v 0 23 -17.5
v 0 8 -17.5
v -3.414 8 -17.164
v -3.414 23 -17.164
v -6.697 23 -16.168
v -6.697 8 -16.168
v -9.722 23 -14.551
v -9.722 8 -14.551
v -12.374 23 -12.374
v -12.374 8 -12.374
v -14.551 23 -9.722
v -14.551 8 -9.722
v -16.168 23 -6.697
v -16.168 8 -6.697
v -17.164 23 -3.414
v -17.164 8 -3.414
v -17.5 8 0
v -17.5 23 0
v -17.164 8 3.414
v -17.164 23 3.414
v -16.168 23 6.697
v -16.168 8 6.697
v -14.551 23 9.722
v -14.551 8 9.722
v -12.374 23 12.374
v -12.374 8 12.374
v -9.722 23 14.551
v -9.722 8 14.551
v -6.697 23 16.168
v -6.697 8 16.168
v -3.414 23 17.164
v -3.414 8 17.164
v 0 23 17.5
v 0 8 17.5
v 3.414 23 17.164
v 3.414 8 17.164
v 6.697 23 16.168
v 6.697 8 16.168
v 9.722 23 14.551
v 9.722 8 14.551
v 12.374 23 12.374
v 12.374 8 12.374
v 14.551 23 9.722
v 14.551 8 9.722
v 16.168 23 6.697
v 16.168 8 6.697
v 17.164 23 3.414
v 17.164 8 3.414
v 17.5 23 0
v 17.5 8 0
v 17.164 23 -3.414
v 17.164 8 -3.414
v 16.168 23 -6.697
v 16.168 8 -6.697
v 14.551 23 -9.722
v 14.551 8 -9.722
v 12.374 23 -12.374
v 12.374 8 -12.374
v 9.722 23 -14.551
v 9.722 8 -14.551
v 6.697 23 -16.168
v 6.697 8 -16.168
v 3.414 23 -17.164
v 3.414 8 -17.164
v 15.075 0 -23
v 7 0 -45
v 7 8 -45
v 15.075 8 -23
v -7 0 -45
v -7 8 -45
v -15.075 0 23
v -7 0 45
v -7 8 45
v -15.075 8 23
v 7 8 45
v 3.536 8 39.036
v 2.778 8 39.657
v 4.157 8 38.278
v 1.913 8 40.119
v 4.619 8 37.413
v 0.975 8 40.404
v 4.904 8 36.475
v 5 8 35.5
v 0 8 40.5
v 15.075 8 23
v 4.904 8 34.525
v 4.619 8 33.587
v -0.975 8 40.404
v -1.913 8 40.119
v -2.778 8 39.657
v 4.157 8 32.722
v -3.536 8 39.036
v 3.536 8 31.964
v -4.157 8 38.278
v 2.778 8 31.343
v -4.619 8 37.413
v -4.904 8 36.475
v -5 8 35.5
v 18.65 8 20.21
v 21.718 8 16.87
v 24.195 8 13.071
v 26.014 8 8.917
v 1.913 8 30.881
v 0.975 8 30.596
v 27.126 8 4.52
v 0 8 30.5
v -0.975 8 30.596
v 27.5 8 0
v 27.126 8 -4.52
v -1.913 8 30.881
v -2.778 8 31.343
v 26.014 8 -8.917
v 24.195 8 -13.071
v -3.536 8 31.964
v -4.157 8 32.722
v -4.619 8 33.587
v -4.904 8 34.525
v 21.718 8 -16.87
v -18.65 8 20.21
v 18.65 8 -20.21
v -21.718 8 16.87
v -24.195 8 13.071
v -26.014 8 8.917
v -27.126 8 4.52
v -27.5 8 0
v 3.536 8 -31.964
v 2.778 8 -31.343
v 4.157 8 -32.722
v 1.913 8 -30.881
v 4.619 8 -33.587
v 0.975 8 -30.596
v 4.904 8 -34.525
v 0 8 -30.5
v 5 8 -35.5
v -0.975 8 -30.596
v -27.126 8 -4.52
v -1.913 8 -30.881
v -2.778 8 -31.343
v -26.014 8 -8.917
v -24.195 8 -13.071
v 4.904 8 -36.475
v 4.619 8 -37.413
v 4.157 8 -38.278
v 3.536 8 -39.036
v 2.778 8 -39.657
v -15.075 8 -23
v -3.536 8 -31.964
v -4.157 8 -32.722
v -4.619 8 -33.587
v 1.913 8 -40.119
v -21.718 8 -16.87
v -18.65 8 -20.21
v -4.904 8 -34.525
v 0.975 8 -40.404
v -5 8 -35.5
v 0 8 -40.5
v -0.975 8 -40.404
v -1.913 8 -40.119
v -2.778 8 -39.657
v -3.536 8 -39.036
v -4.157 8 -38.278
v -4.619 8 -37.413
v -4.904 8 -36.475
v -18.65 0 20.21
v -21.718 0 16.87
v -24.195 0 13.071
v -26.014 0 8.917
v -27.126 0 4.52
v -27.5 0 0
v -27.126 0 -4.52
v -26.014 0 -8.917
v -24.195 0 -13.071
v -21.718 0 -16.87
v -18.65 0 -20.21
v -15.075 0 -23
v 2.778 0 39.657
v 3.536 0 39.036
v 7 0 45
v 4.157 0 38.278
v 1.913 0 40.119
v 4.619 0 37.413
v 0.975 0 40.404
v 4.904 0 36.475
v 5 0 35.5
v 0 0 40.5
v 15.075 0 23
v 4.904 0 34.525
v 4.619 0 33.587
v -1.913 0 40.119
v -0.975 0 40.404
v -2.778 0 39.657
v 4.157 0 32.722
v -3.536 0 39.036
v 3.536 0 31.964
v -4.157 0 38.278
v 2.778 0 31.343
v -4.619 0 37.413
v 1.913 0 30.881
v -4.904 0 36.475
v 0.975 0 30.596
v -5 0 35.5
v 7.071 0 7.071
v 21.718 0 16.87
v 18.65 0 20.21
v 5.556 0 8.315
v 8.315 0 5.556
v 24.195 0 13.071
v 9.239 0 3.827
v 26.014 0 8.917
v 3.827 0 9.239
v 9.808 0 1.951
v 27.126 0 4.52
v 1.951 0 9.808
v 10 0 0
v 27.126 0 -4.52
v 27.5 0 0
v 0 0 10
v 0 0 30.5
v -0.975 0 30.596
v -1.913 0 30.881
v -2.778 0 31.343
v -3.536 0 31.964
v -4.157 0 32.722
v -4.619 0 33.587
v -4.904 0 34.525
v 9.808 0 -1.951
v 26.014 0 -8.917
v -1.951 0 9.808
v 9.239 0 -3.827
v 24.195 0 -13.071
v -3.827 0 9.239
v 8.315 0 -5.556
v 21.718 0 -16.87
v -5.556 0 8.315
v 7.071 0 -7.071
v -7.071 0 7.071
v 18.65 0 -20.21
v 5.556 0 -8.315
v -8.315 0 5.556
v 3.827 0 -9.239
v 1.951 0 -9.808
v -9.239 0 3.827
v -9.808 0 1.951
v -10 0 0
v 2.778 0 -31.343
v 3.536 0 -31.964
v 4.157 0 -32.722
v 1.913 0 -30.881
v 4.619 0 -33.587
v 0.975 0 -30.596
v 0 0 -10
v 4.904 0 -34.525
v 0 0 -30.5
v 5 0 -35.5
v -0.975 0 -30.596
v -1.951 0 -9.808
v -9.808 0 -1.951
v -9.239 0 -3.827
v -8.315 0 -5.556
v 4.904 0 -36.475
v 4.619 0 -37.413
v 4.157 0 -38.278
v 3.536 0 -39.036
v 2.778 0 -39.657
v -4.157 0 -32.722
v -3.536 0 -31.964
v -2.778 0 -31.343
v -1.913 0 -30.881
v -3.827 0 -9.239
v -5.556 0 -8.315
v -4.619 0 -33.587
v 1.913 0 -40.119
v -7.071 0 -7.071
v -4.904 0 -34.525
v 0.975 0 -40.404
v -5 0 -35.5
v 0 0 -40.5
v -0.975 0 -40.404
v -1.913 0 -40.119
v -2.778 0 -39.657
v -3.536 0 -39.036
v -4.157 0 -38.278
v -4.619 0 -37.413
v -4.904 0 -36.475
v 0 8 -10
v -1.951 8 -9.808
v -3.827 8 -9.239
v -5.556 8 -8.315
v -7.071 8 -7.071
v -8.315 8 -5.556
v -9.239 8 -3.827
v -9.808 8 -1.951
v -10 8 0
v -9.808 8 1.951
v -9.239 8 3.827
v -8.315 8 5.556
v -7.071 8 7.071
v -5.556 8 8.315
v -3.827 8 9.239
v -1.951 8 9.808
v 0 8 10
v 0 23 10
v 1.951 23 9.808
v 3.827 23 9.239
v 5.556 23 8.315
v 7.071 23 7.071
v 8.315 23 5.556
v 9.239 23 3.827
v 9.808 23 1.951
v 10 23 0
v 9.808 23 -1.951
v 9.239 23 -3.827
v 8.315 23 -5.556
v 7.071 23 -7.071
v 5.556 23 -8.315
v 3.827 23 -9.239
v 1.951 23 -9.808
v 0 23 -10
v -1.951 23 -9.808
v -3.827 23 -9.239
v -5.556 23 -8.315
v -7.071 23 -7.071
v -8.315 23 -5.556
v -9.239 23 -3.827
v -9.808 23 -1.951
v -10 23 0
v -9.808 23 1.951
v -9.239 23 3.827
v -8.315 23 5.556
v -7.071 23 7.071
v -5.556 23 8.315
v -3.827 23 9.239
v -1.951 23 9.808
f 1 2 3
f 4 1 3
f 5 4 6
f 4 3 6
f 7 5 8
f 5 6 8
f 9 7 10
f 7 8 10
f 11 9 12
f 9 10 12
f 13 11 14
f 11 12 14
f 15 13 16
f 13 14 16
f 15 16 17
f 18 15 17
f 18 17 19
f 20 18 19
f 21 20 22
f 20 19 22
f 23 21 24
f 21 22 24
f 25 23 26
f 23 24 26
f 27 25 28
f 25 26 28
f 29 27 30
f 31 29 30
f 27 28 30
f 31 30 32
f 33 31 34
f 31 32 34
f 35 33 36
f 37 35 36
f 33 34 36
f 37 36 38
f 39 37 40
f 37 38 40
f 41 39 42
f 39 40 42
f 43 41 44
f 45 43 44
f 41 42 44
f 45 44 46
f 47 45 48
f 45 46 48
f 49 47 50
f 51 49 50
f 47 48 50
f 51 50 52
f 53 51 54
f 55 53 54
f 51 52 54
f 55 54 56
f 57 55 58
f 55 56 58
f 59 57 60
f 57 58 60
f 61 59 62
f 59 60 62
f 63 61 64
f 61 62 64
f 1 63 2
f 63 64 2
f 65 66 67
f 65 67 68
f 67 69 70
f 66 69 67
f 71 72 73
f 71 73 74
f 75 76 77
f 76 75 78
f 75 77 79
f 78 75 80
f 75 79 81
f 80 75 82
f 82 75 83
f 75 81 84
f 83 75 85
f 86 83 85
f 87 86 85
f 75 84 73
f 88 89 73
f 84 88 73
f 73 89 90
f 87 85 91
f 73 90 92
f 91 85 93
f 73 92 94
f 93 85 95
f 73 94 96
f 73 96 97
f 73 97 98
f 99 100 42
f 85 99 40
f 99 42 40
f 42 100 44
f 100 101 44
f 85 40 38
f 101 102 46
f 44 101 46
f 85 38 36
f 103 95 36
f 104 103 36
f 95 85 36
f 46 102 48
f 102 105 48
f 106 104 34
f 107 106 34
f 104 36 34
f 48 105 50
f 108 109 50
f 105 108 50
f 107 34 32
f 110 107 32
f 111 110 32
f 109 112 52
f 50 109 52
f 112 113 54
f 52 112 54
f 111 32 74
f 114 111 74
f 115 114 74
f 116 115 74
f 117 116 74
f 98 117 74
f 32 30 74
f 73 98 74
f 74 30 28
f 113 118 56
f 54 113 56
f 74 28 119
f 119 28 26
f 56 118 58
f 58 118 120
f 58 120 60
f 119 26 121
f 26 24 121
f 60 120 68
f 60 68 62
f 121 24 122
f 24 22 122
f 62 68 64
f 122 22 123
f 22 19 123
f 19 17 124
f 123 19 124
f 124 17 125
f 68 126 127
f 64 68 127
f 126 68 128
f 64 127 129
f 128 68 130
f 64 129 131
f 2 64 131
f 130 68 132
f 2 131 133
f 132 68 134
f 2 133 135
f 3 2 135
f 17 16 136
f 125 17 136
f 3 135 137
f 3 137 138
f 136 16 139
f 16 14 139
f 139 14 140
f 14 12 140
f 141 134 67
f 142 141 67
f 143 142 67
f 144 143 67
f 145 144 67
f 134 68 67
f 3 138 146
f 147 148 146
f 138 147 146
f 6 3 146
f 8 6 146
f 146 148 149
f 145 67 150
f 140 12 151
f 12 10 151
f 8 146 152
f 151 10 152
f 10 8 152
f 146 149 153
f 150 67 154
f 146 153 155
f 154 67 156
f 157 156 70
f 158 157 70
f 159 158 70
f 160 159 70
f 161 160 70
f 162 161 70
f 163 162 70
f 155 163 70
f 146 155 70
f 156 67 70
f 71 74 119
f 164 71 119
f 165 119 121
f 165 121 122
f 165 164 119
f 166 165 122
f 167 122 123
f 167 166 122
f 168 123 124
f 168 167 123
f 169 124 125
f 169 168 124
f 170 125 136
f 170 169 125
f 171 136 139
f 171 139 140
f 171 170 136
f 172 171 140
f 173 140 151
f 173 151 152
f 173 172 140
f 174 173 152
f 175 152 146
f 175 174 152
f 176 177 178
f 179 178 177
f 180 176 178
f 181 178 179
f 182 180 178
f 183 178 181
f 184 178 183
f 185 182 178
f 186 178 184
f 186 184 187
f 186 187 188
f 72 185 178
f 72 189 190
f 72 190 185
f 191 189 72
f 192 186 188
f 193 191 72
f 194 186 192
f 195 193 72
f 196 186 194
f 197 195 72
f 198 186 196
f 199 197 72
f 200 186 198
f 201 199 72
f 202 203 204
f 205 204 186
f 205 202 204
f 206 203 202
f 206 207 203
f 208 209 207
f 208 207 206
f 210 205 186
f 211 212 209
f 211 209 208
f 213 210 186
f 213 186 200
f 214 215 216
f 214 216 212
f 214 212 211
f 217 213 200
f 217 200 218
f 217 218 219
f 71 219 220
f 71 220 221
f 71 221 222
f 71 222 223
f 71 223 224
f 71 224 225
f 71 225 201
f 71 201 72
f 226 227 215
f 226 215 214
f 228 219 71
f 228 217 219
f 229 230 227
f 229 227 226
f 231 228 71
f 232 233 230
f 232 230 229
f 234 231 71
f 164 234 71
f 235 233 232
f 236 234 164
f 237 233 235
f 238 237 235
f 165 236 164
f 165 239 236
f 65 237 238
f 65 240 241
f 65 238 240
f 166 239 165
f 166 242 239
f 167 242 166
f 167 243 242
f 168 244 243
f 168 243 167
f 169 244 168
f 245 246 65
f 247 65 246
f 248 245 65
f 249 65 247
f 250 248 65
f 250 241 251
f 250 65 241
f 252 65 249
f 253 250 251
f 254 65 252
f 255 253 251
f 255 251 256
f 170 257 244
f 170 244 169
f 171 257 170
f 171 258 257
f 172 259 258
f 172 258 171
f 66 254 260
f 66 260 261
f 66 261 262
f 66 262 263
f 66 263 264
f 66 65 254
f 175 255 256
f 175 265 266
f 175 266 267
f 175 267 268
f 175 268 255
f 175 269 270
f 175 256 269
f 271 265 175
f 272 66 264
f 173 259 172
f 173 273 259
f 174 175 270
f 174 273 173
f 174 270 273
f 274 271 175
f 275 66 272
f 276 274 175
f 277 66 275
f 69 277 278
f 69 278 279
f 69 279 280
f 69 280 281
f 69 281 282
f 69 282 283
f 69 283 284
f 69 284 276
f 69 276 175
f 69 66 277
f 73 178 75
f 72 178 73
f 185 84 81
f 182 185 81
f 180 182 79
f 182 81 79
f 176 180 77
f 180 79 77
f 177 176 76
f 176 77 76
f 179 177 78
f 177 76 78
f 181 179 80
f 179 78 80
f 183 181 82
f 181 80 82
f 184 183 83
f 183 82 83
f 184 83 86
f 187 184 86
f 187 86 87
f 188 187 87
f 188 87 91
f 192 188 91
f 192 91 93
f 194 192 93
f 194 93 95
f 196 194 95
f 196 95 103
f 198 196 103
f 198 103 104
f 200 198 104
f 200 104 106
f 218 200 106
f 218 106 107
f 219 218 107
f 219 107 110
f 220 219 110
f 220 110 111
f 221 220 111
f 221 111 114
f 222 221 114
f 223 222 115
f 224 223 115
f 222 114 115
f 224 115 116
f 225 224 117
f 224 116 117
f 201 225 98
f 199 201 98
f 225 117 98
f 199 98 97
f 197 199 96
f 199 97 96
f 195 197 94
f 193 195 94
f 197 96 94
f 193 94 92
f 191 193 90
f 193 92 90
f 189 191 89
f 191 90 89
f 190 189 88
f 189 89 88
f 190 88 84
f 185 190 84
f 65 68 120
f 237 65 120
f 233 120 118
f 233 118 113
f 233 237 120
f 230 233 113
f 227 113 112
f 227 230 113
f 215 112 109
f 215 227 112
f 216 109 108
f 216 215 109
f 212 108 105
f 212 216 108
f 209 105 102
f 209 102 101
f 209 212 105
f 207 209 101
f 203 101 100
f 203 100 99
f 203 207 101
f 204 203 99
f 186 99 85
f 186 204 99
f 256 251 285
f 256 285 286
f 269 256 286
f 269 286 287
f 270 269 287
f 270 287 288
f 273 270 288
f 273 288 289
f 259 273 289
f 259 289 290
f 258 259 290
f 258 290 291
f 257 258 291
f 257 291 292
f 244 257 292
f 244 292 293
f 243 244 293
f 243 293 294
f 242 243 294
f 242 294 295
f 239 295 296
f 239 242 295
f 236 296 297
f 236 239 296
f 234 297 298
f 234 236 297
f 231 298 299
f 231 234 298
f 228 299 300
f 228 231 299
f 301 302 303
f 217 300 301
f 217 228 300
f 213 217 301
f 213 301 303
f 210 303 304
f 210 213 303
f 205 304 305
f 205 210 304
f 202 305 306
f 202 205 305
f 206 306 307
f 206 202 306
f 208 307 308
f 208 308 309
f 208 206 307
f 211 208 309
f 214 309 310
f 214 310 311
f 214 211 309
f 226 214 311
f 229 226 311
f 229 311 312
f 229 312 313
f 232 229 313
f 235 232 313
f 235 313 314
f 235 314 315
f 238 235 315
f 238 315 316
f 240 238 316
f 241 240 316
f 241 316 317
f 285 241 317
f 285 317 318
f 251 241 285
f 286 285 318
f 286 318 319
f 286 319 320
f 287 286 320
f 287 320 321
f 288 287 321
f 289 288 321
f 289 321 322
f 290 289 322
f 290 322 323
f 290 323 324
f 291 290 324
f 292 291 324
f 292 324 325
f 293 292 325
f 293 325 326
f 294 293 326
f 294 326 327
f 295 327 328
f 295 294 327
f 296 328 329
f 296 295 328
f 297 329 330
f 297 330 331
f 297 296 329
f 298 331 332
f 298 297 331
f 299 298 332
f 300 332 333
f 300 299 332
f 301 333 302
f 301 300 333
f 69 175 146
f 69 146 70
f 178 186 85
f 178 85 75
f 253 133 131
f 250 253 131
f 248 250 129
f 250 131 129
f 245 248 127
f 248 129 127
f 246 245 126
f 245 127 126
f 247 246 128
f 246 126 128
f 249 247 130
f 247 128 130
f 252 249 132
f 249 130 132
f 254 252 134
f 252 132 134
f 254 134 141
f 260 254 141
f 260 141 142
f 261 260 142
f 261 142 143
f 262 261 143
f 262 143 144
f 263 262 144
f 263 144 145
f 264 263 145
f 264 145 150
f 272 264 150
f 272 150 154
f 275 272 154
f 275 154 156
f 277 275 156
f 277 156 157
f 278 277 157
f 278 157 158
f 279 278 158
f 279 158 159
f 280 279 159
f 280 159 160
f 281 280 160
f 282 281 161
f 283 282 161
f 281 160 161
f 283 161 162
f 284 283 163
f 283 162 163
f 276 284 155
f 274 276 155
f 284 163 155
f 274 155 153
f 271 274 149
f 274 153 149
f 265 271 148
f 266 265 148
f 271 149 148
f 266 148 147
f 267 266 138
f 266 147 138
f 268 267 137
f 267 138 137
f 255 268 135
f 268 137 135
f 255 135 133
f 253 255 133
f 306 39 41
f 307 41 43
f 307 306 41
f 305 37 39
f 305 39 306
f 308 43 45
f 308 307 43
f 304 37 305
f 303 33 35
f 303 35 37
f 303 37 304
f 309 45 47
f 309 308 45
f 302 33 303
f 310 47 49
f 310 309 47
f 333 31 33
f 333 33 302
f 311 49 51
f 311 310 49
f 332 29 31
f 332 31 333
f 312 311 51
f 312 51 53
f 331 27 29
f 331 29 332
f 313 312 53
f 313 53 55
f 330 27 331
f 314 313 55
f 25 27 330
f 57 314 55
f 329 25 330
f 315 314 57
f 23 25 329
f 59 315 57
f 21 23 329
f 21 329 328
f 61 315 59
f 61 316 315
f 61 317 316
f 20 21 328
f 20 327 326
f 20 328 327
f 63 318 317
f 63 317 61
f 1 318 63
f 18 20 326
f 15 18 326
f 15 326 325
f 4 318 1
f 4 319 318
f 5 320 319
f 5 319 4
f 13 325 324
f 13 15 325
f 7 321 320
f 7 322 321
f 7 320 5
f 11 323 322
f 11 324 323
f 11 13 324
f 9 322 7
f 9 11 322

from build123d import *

# Parameters (mm, degrees)
BOSS_EXTRU_1_DEPTH      = 8
ESQUISSE2_R             = 17.5
ESQUISSE2_R_2           = 10
BOSS_EXTRU_2_DEPTH      = 15
ENL_V_START             = -10
ESQUISSE3_R             = 10
ENL_V_MAT_EXTRU_1_DEPTH = 10
ESQUISSE4_R             = 5
ENL_V_MAT_EXTRU_2_DEPTH = 10


with BuildPart() as part:
    # Esquisse1 → Boss.-Extru.1 (new body)
    with BuildSketch(Plane(origin=(0, 0, 0), x_dir=(1, 0, 0), z_dir=(0, 1, 0))):
        with BuildLine():
            Line((-15.074813432, 23), (-7, 45))
            Line((-7, 45), (7, 45))
            Line((7, 45), (15.074813432, 23))
            ThreePointArc((15.074813432, 23), (27.5, 0), (15.074813432, -23))
            Line((15.074813432, -23), (7, -45))
            Line((7, -45), (-7, -45))
            Line((-7, -45), (-15.074813432, -23))
            ThreePointArc((-15.074813432, -23), (-27.5, 0), (-15.074813432, 23))
        make_face()
    extrude(amount=BOSS_EXTRU_1_DEPTH)

    # Esquisse2 → Boss.-Extru.2 (add)
    with BuildSketch(Plane(origin=(0, 8, 0), x_dir=(1, 0, 0), z_dir=(0, 1, 0))):
        with Locations(Location((0, 0, 0), (0, 0, 90))):
            Circle(ESQUISSE2_R)
        with Locations(Location((0, 0, 0), (0, 0, 270))):
            Circle(ESQUISSE2_R_2, mode=Mode.SUBTRACT)
    extrude(amount=BOSS_EXTRU_2_DEPTH)

    # Esquisse3 → Enlèv. mat.-Extru.1 (cut)
    with BuildSketch(Plane(origin=(0, 8, 0), x_dir=(1, 0, 0), z_dir=(0, 1, 0)).offset(ENL_V_START)):
        with Locations(Location((0, 0, 0), (0, 0, 90))):
            Circle(ESQUISSE3_R)
    extrude(amount=ENL_V_MAT_EXTRU_1_DEPTH, mode=Mode.SUBTRACT)

    # Esquisse4 → Enlèv. mat.-Extru.2 (cut)
    with BuildSketch(Plane(origin=(0, 8, 0), x_dir=(1, 0, 0), z_dir=(0, 1, 0))):
        with Locations(Location((0, 35.5, 0), (0, 0, 270))):
            Circle(ESQUISSE4_R)
        with Locations(Location((0, -35.5, 0), (0, 0, 270))):
            Circle(ESQUISSE4_R)
    extrude(amount=-ENL_V_MAT_EXTRU_2_DEPTH, mode=Mode.SUBTRACT)


solid = part.part
